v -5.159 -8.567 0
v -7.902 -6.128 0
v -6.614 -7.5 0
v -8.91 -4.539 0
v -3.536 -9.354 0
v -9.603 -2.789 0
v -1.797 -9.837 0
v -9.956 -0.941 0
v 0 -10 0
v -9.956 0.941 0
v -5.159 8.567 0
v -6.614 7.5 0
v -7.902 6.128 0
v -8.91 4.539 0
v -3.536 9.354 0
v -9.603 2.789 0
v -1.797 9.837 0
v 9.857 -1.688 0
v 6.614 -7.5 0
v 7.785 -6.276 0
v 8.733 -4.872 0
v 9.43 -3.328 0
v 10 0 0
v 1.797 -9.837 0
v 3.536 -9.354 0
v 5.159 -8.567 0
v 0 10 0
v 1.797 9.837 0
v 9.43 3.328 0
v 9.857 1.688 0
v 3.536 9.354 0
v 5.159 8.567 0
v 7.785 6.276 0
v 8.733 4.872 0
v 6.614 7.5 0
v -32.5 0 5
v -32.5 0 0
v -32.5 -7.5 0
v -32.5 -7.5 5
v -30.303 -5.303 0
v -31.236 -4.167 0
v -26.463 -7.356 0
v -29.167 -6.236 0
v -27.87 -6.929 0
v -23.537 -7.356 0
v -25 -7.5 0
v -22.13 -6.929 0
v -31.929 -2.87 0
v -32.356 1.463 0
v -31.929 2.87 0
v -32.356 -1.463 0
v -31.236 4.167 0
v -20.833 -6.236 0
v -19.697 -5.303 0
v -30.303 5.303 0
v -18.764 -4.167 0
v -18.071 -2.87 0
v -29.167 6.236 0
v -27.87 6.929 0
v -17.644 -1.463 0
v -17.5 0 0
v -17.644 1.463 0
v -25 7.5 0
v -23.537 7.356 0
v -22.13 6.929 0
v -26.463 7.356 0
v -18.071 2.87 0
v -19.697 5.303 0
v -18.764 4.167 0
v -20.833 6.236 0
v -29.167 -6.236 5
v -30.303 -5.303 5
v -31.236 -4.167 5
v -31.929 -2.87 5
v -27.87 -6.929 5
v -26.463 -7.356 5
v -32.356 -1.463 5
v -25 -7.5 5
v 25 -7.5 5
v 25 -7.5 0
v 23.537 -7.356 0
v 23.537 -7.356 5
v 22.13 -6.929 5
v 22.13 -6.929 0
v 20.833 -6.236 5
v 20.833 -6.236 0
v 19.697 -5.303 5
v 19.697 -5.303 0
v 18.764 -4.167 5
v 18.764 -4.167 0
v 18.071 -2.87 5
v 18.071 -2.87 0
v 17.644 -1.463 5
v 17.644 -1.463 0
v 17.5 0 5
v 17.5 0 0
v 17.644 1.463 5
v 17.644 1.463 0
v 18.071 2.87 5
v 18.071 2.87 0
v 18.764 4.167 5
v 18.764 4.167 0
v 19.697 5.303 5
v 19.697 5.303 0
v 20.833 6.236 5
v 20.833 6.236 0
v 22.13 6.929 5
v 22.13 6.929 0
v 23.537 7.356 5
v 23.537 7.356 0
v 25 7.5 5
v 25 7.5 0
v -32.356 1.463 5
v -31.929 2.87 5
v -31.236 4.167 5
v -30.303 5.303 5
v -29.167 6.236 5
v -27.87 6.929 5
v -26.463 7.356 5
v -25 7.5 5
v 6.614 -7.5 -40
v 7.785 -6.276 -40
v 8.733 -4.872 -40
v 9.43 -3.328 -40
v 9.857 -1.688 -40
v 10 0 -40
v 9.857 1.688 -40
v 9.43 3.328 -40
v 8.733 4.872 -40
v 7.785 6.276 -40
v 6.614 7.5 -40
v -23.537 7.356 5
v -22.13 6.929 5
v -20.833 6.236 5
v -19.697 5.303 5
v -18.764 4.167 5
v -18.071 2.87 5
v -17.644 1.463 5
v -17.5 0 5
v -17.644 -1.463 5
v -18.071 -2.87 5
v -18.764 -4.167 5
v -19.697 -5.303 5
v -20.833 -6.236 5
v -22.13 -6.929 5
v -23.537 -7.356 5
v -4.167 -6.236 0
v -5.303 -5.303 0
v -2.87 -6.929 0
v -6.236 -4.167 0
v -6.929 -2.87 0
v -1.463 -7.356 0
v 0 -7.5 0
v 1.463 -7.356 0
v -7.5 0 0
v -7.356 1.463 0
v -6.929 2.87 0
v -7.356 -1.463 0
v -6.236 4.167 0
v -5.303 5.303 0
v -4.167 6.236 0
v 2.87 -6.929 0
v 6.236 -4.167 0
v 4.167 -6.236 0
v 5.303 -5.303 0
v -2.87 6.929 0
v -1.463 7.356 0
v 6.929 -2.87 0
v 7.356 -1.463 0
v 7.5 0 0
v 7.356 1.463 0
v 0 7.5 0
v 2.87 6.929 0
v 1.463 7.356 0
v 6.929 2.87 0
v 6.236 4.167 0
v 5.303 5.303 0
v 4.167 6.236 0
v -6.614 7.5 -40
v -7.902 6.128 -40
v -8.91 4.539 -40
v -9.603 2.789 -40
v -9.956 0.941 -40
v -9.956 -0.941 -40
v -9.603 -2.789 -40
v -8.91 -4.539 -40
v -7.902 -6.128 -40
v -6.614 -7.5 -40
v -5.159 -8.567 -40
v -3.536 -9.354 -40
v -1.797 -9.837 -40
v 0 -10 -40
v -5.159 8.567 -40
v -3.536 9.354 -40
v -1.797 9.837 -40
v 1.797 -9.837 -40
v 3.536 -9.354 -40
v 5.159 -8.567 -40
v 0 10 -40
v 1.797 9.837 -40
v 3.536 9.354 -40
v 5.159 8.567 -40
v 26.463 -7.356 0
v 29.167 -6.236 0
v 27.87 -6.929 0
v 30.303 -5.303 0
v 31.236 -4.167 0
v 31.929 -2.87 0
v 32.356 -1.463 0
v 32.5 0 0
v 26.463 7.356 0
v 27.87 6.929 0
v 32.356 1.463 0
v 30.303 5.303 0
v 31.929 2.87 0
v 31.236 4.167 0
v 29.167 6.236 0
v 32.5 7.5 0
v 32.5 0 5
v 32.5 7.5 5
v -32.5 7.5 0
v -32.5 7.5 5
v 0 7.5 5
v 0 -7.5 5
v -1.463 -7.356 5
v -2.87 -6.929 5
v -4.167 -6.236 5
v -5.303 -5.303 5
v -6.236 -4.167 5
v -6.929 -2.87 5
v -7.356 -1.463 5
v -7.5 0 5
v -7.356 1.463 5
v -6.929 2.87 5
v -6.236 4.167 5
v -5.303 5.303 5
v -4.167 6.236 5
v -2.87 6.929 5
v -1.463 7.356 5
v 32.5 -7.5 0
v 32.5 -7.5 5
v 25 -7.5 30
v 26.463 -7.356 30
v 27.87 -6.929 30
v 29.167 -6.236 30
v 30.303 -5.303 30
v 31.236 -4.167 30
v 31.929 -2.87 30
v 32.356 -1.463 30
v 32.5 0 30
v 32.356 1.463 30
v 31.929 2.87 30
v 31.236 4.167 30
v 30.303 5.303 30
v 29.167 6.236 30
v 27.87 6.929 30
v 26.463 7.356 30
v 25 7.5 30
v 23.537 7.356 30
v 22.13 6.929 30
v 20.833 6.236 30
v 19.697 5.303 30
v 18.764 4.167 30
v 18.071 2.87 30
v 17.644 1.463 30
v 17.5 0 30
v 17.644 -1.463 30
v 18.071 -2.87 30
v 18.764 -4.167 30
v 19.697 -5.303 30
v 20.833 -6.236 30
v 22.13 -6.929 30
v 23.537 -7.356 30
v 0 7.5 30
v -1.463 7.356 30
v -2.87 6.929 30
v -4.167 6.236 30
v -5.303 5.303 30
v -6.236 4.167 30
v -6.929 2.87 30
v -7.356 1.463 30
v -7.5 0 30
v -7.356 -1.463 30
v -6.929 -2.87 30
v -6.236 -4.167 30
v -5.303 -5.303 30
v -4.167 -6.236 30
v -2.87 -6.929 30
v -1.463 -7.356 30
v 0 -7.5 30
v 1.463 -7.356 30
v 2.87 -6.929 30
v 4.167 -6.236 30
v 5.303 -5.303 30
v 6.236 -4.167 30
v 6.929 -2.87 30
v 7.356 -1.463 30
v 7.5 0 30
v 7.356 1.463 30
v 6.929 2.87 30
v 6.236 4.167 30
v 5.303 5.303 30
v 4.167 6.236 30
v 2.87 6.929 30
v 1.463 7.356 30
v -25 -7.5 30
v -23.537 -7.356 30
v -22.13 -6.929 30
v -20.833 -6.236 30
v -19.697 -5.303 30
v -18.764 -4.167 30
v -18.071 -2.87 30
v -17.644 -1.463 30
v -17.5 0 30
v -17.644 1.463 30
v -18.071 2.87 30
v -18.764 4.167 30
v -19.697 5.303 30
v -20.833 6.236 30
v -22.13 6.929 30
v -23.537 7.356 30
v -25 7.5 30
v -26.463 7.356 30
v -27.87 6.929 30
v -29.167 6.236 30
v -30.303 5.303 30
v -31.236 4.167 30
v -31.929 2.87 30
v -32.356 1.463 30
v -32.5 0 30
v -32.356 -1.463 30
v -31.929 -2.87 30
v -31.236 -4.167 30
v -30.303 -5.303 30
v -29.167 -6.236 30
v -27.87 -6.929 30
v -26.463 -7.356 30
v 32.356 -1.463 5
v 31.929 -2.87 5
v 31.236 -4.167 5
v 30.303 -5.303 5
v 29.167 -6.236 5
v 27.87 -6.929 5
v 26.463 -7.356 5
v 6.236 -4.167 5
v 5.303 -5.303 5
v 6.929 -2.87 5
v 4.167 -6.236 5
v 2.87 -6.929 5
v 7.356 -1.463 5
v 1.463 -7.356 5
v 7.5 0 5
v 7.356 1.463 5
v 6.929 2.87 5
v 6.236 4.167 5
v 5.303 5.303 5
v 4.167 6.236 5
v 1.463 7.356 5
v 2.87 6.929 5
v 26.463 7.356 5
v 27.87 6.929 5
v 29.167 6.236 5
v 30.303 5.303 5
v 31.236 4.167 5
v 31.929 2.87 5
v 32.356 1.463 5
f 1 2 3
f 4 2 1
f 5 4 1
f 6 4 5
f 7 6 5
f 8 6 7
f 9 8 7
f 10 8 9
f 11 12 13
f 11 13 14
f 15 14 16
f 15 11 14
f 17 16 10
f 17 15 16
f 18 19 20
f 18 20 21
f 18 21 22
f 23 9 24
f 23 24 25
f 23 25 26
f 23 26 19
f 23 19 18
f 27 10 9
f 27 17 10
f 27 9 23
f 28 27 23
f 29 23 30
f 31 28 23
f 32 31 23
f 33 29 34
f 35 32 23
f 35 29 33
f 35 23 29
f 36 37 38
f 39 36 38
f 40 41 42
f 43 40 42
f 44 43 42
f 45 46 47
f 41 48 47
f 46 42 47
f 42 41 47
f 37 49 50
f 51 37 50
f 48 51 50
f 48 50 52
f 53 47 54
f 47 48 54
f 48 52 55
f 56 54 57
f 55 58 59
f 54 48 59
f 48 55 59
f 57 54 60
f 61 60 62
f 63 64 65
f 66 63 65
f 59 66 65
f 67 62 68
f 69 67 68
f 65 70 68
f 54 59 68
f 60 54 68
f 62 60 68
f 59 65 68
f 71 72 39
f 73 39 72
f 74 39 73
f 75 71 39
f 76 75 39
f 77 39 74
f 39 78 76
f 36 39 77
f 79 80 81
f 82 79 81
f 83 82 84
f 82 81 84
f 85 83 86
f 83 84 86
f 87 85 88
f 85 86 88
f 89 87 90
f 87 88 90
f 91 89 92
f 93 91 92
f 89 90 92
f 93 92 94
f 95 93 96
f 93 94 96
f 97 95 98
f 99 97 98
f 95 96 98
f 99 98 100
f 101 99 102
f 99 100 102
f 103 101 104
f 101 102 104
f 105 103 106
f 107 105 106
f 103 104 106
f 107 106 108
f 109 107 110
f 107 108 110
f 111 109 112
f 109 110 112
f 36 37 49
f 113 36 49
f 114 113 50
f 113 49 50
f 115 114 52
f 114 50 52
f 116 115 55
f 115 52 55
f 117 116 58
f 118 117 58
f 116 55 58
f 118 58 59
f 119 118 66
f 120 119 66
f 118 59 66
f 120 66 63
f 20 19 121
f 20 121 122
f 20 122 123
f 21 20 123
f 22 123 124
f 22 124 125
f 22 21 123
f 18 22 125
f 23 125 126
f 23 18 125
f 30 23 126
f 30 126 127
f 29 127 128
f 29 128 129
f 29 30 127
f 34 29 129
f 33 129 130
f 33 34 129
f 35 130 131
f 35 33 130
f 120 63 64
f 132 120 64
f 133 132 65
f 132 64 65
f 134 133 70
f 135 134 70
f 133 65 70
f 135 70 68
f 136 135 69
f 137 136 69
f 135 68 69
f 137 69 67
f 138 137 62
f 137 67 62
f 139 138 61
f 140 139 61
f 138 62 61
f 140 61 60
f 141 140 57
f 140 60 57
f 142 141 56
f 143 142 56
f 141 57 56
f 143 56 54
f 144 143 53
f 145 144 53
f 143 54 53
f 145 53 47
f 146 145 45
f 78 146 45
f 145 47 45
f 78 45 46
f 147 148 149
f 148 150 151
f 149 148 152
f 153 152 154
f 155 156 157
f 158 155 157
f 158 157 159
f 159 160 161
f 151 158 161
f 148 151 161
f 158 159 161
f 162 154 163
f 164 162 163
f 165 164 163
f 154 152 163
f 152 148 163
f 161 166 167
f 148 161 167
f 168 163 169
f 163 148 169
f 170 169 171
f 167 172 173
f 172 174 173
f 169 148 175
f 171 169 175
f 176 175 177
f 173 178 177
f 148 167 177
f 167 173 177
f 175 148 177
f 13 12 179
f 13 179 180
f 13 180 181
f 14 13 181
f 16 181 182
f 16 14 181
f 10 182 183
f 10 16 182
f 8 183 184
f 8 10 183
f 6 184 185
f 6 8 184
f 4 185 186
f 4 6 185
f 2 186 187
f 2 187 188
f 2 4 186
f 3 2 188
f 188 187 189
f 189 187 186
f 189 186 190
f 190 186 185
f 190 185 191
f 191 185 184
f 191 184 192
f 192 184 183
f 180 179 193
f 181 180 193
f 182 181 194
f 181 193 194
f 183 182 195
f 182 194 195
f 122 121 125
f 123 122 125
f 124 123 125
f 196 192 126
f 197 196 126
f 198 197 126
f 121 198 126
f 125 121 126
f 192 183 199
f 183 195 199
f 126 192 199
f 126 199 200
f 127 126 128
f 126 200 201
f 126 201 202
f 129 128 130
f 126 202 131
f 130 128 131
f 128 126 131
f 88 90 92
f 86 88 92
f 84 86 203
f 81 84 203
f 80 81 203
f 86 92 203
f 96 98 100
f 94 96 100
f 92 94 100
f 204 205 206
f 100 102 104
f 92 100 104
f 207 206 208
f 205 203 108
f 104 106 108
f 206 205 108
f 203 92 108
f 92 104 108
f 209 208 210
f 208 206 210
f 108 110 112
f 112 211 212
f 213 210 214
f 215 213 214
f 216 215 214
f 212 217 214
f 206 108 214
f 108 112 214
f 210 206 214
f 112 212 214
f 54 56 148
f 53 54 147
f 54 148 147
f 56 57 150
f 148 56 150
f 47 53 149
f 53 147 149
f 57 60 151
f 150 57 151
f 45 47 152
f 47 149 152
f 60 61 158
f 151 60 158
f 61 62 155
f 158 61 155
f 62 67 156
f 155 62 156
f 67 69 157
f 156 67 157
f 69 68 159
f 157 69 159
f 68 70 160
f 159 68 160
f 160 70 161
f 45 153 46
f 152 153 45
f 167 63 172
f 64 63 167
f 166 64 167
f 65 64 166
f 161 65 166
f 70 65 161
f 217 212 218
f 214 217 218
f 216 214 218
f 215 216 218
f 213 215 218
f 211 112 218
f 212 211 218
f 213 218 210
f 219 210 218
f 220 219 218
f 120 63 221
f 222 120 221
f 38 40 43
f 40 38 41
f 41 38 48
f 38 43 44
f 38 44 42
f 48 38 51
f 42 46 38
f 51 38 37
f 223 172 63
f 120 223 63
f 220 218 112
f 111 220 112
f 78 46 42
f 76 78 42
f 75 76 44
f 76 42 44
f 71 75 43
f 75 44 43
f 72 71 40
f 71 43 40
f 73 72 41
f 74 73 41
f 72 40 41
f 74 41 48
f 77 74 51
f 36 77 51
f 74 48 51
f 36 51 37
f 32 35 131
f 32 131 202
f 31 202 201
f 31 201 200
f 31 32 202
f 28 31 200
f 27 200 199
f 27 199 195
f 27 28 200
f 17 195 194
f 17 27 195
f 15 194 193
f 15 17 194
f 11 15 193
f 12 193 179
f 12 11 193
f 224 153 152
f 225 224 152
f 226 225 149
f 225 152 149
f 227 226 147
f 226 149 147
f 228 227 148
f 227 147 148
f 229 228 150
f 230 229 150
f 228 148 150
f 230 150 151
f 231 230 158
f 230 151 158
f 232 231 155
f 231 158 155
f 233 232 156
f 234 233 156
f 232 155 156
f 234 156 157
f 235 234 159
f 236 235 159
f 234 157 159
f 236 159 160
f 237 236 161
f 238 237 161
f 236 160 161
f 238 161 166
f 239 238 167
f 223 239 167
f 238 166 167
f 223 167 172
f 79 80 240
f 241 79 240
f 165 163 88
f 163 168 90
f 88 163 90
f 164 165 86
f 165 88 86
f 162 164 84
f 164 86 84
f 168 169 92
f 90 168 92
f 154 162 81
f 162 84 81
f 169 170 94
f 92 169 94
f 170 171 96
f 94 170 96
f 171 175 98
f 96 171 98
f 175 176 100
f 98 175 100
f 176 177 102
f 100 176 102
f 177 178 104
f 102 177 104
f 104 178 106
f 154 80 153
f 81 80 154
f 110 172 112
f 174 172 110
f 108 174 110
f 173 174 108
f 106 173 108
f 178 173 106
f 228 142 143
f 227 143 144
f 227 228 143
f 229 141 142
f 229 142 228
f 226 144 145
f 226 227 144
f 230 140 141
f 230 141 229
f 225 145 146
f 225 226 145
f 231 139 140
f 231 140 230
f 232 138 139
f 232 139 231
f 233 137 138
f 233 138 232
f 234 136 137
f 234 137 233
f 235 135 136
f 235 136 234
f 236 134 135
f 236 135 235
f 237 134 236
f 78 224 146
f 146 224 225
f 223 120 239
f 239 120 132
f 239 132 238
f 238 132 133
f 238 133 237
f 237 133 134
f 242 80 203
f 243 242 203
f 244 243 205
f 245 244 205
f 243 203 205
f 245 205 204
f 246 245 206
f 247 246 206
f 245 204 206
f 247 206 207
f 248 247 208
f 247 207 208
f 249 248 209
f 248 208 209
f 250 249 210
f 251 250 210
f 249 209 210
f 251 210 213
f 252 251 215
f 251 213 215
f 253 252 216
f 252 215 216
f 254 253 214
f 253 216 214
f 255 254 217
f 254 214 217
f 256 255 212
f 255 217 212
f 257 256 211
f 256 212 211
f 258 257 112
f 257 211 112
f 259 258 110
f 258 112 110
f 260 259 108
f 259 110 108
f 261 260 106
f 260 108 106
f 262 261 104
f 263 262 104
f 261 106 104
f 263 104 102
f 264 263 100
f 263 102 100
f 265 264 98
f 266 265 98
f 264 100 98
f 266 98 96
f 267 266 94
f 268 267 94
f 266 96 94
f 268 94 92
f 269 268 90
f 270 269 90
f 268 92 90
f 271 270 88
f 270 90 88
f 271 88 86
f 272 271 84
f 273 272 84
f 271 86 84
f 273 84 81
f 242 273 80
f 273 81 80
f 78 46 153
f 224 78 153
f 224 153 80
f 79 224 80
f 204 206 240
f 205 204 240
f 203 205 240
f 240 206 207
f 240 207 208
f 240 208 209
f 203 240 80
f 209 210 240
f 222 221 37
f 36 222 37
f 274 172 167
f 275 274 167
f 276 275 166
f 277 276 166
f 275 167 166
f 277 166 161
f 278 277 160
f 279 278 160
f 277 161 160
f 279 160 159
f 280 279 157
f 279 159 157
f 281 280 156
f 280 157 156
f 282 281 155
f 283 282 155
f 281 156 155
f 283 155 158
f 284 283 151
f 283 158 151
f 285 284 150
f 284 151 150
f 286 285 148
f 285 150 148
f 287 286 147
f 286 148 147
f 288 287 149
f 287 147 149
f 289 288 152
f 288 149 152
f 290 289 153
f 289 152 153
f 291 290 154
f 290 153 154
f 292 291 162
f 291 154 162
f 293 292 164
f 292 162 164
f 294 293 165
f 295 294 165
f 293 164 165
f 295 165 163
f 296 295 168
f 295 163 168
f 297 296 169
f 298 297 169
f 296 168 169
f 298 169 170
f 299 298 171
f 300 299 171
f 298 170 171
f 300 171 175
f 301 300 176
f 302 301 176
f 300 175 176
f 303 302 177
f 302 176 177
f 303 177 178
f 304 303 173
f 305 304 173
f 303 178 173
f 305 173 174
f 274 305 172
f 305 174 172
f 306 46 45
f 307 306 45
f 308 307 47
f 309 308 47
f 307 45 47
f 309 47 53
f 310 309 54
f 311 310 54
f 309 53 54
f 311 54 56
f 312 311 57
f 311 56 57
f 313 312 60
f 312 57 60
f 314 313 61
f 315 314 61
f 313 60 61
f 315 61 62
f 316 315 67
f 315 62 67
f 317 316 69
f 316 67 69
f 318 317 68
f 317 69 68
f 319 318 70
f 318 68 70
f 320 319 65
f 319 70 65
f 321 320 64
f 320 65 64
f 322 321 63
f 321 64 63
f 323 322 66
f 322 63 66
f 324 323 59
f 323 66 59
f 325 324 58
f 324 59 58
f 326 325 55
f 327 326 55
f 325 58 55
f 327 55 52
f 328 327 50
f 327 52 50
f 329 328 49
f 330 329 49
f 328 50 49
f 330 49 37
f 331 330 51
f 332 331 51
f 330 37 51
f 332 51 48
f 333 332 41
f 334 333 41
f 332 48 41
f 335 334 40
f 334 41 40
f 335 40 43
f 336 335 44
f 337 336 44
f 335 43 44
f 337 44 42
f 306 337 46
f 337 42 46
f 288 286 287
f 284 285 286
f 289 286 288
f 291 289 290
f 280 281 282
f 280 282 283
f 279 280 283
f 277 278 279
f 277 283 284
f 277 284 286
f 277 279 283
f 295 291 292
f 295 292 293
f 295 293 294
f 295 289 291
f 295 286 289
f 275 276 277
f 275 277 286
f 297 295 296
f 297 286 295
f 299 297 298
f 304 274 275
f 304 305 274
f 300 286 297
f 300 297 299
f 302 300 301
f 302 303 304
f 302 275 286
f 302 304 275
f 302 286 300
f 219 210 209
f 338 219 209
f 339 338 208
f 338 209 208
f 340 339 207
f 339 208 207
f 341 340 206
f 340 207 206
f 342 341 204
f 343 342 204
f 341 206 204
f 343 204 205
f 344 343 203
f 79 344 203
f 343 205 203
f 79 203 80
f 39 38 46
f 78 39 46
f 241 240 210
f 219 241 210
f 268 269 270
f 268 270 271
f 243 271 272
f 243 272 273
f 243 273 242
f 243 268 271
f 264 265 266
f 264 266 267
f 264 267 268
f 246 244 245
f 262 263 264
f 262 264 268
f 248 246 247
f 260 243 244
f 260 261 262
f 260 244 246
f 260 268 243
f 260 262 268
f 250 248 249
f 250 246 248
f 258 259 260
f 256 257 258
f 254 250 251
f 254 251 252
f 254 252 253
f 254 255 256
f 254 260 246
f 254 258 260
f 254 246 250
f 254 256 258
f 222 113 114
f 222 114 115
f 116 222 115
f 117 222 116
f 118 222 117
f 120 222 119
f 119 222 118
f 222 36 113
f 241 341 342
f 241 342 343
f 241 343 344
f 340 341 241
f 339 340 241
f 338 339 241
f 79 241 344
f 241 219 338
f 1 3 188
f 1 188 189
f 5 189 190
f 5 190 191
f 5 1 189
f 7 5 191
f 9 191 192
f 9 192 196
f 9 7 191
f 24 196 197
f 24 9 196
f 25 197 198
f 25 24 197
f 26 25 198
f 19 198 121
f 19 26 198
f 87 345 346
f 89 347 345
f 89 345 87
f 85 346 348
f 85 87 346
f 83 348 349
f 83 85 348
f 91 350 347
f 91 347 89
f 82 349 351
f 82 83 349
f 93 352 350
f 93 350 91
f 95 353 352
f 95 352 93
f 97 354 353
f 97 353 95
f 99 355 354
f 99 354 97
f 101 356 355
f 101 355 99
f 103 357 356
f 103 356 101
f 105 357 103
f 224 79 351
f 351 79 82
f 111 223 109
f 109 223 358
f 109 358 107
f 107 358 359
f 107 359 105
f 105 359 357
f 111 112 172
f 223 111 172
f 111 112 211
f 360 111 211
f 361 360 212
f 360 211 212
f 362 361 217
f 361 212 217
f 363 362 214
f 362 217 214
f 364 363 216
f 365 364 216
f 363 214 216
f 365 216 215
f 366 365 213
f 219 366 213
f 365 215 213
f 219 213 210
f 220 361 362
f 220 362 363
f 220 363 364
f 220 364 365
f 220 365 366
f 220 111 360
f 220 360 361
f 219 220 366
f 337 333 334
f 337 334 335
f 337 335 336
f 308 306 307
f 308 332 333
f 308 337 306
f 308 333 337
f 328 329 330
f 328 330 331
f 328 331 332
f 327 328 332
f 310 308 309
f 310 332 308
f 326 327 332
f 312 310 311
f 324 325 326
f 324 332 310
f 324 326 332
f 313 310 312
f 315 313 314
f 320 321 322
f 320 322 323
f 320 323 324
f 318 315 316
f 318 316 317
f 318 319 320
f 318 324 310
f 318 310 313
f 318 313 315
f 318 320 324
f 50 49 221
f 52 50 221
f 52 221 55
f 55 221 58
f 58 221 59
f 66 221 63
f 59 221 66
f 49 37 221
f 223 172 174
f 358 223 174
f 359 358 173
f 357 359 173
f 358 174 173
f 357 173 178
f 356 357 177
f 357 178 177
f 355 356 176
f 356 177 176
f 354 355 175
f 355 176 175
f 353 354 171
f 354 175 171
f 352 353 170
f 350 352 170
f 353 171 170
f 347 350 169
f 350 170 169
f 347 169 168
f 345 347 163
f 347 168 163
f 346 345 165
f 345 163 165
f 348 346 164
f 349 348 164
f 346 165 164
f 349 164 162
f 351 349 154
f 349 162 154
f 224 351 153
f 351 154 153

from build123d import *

# Parameters (mm, degrees)
F1_DEPTH = 30
F2_DEPTH = 5
F3_DEPTH = 40


with BuildPart() as f1:
    # F0 (on Top) → F1 (new body)
    with BuildSketch(Plane.XY):
        with BuildLine():
            ThreePointArc((-17.5, 0), (-19.6966991411, 5.3033008589), (-25, 7.5))
            ThreePointArc((-25, 7.5), (-30.3033008589, 5.3033008589), (-32.5, 0))
            ThreePointArc((-32.5, 0), (-30.3033008589, -5.3033008589), (-25, -7.5))
            ThreePointArc((-25, -7.5), (-19.6966991411, -5.3033008589), (-17.5, 0))
        make_face()
    extrude(amount=F1_DEPTH)


with BuildPart() as f1b:
    # F0 (on Top) → F1, piece 2 (new body)
    with BuildSketch(Plane.XY):
        with BuildLine():
            ThreePointArc((32.5, 0), (30.3033008589, 5.3033008589), (25, 7.5))
            ThreePointArc((25, 7.5), (17.5, 0), (25, -7.5))
            ThreePointArc((25, -7.5), (30.3033008589, -5.3033008589), (32.5, 0))
        make_face()
    extrude(amount=F1_DEPTH)


with BuildPart() as f1c:
    # F0 (on Top) → F1, piece 3 (new body)
    with BuildSketch(Plane.XY):
        with BuildLine():
            ThreePointArc((-2.86e-08, -7.5), (5.3033008488, -5.303300869), (7.5, 0))
            ThreePointArc((7.5, 0), (5.3033008589, 5.3033008589), (0, 7.5))
            ThreePointArc((0, 7.5), (-7.5, 1.43e-08), (-2.86e-08, -7.5))
        make_face()
    extrude(amount=F1_DEPTH)


with BuildPart() as f2:
    # F0 (on Top) → F2 (new body)
    with BuildSketch(Plane.XY):
        with BuildLine():
            ThreePointArc((-6.6143782777, -7.5), (-10, 0), (-6.6143782777, 7.5))
            Line((-6.6143782777, 7.5), (-25, 7.5))
            ThreePointArc((-25, 7.5), (-19.6966991411, 5.3033008589), (-17.5, 0))
            ThreePointArc((-17.5, 0), (-19.6966991411, -5.3033008589), (-25, -7.5))
            Line((-25, -7.5), (-6.6143782777, -7.5))
        make_face()
        with BuildLine():
            ThreePointArc((-2.86e-08, -7.5), (-7.5, 1.43e-08), (0, 7.5))
            Line((0, 7.5), (-6.6143782777, 7.5))
            ThreePointArc((-6.6143782777, 7.5), (-10, 0), (-6.6143782777, -7.5))
            Line((-6.6143782777, -7.5), (-2.86e-08, -7.5))
        make_face()
    extrude(amount=F2_DEPTH)


with BuildPart() as f2b:
    # F0 (on Top) → F2, piece 2 (new body)
    with BuildSketch(Plane.XY):
        with BuildLine():
            Line((-32.5, -7.5), (-25, -7.5))
            ThreePointArc((-25, -7.5), (-30.3033008589, -5.3033008589), (-32.5, 0))
            Line((-32.5, 0), (-32.5, -7.5))
        make_face()
    extrude(amount=F2_DEPTH)


with BuildPart() as f2c:
    # F0 (on Top) → F2, piece 3 (new body)
    with BuildSketch(Plane.XY):
        with BuildLine():
            ThreePointArc((0, 7.5), (5.3033008589, 5.3033008589), (7.5, 0))
            ThreePointArc((7.5, 0), (5.3033008488, -5.303300869), (-2.86e-08, -7.5))
            Line((-2.86e-08, -7.5), (6.6143782777, -7.5))
            ThreePointArc((6.6143782777, -7.5), (9.1143782777, -4.1143782777), (10, 0))
            ThreePointArc((10, 0), (9.1143782777, 4.1143782777), (6.6143782777, 7.5))
            Line((6.6143782777, 7.5), (0, 7.5))
        make_face()
        with BuildLine():
            Line((25, 7.5), (6.6143782777, 7.5))
            ThreePointArc((6.6143782777, 7.5), (9.1143782777, 4.1143782777), (10, 0))
            ThreePointArc((10, 0), (9.1143782777, -4.1143782777), (6.6143782777, -7.5))
            Line((6.6143782777, -7.5), (25, -7.5))
            ThreePointArc((25, -7.5), (17.5, 0), (25, 7.5))
        make_face()
    extrude(amount=F2_DEPTH)


with BuildPart() as f2d:
    # F0 (on Top) → F2, piece 4 (new body)
    with BuildSketch(Plane.XY):
        with BuildLine():
            ThreePointArc((32.5, 0), (30.3033008589, -5.3033008589), (25, -7.5))
            Line((25, -7.5), (32.5, -7.5))
            Line((32.5, -7.5), (32.5, 0))
        make_face()
    extrude(amount=F2_DEPTH)


with BuildPart() as f2e:
    # F0 (on Top) → F2, piece 5 (new body)
    with BuildSketch(Plane.XY):
        with BuildLine():
            Line((32.5, 7.5), (25, 7.5))
            ThreePointArc((25, 7.5), (30.3033008589, 5.3033008589), (32.5, 0))
            Line((32.5, 0), (32.5, 7.5))
        make_face()
    extrude(amount=F2_DEPTH)


with BuildPart() as f2f:
    # F0 (on Top) → F2, piece 6 (new body)
    with BuildSketch(Plane.XY):
        with BuildLine():
            ThreePointArc((-32.5, 0), (-30.3033008589, 5.3033008589), (-25, 7.5))
            Line((-25, 7.5), (-32.5, 7.5))
            Line((-32.5, 7.5), (-32.5, 0))
        make_face()
    extrude(amount=F2_DEPTH)


with BuildPart() as f3:
    # F0 (on Top) → F3 (new body)
    with BuildSketch(Plane.XY):
        with BuildLine():
            Line((6.6143782777, -7.5), (-2.86e-08, -7.5))
            Line((-2.86e-08, -7.5), (-6.6143782777, -7.5))
            ThreePointArc((-6.6143782777, -7.5), (0, -10), (6.6143782777, -7.5))
        make_face()
        with BuildLine():
            ThreePointArc((-2.86e-08, -7.5), (-7.5, 1.43e-08), (0, 7.5))
            Line((0, 7.5), (-6.6143782777, 7.5))
            ThreePointArc((-6.6143782777, 7.5), (-10, 0), (-6.6143782777, -7.5))
            Line((-6.6143782777, -7.5), (-2.86e-08, -7.5))
        make_face()
        with BuildLine():
            ThreePointArc((-2.86e-08, -7.5), (5.3033008488, -5.303300869), (7.5, 0))
            ThreePointArc((7.5, 0), (5.3033008589, 5.3033008589), (0, 7.5))
            ThreePointArc((0, 7.5), (-7.5, 1.43e-08), (-2.86e-08, -7.5))
        make_face()
        with BuildLine():
            Line((-6.6143782777, 7.5), (0, 7.5))
            Line((0, 7.5), (6.6143782777, 7.5))
            ThreePointArc((6.6143782777, 7.5), (0, 10), (-6.6143782777, 7.5))
        make_face()
        with BuildLine():
            ThreePointArc((0, 7.5), (5.3033008589, 5.3033008589), (7.5, 0))
            ThreePointArc((7.5, 0), (5.3033008488, -5.303300869), (-2.86e-08, -7.5))
            Line((-2.86e-08, -7.5), (6.6143782777, -7.5))
            ThreePointArc((6.6143782777, -7.5), (9.1143782777, -4.1143782777), (10, 0))
            ThreePointArc((10, 0), (9.1143782777, 4.1143782777), (6.6143782777, 7.5))
            Line((6.6143782777, 7.5), (0, 7.5))
        make_face()
    extrude(amount=-F3_DEPTH)


solid = Compound([f1.part, f1b.part, f1c.part, f2.part, f2b.part, f2c.part, f2d.part, f2e.part, f2f.part, f3.part])
